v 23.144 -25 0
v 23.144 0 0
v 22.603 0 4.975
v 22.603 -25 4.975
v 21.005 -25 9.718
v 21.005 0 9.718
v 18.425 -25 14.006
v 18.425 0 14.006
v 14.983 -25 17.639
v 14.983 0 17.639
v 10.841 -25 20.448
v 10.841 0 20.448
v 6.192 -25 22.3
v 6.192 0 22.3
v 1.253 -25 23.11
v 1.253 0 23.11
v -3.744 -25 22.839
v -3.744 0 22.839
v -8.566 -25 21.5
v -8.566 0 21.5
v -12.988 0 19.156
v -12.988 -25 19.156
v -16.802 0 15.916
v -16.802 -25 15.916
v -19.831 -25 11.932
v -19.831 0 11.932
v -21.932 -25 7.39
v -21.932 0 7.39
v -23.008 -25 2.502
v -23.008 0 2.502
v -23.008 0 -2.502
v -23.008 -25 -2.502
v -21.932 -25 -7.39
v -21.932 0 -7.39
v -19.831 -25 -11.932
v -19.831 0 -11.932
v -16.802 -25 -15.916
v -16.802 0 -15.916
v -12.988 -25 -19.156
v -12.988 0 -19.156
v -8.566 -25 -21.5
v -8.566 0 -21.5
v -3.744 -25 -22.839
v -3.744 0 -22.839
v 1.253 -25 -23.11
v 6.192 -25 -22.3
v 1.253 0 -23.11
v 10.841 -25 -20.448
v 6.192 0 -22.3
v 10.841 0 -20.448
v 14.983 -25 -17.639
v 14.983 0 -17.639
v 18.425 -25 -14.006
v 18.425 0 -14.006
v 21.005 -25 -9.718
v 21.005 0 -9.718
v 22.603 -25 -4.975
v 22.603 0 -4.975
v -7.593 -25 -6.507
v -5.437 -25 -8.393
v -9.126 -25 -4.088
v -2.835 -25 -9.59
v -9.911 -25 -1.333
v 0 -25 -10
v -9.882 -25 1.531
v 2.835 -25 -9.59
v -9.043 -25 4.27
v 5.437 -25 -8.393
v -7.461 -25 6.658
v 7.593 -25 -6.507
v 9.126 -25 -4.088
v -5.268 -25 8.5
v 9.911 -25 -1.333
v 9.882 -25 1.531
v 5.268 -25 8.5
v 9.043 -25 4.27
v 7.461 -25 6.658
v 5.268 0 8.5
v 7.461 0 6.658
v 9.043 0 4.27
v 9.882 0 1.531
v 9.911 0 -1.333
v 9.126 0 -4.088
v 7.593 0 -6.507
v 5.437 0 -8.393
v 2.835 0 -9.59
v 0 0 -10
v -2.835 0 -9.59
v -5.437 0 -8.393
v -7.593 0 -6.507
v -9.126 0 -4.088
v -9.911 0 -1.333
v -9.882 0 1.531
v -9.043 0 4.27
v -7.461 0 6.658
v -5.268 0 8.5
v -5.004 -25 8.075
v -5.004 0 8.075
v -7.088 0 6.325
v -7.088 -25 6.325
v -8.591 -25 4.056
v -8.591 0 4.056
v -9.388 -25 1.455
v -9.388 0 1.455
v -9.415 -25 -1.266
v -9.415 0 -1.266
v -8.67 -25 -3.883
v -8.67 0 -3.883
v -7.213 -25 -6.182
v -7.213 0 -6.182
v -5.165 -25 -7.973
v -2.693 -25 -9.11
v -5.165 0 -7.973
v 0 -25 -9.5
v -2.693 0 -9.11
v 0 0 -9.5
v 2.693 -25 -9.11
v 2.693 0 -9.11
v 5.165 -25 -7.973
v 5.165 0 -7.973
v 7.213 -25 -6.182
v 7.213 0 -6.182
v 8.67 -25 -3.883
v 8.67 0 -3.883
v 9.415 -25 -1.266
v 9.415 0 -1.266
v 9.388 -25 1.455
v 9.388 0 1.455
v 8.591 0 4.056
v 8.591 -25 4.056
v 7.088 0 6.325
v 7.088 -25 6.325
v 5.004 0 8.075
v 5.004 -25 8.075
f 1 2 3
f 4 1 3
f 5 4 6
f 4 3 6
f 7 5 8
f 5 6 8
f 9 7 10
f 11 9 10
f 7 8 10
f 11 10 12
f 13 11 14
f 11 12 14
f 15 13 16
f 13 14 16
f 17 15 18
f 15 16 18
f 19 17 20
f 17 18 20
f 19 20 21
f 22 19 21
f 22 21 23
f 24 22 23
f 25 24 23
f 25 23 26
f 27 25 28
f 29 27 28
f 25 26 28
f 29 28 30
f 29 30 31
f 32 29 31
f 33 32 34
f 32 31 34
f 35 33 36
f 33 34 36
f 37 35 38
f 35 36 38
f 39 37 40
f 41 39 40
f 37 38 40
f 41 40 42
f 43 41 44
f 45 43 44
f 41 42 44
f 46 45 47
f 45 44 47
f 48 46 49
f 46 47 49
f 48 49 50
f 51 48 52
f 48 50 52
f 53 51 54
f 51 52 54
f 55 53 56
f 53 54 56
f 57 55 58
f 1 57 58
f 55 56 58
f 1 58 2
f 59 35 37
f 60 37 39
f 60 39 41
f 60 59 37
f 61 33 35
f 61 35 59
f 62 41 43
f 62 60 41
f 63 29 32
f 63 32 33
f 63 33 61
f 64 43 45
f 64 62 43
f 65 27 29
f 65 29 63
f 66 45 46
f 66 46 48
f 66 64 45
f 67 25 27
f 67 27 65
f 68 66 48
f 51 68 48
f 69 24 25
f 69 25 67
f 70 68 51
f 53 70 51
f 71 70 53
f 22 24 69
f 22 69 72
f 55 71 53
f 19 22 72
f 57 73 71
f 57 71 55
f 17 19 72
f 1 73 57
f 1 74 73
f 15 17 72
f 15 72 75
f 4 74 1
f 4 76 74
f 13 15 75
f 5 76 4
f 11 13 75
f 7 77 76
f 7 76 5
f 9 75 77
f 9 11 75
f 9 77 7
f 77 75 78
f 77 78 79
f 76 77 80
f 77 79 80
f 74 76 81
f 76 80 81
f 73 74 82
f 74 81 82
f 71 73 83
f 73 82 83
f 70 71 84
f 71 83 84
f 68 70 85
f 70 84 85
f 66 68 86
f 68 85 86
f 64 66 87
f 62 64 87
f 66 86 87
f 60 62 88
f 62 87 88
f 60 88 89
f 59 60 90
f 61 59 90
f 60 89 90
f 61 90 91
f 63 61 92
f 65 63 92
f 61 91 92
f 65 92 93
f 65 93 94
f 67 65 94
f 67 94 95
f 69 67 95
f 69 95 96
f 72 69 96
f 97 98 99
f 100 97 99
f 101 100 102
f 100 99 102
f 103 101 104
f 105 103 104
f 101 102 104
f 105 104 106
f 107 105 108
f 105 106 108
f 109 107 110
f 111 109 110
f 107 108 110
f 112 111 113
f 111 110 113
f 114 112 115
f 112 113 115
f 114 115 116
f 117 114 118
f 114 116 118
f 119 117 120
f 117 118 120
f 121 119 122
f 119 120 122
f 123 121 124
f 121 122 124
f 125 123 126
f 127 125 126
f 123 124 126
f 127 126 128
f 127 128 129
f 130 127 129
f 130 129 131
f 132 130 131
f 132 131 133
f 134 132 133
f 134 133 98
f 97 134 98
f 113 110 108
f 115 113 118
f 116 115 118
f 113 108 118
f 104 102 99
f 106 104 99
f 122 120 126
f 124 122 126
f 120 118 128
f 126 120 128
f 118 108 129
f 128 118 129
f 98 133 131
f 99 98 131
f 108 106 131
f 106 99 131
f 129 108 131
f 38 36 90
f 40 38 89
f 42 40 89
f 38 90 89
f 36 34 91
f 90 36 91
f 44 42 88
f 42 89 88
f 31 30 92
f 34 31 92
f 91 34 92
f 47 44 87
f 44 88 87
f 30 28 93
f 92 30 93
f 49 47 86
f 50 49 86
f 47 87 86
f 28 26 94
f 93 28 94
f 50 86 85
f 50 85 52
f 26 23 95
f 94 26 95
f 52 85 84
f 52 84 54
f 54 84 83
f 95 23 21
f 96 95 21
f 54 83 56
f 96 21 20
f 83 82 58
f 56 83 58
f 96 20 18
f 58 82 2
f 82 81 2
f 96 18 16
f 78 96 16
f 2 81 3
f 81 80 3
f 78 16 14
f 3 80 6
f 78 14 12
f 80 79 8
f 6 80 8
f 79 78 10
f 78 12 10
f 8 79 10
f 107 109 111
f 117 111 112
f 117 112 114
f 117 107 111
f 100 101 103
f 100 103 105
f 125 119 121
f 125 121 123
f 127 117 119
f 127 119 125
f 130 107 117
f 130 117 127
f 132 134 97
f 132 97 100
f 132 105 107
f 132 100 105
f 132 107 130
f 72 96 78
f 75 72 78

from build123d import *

# Parameters (mm, degrees)
F0_R     = 23.143758
F1_DEPTH = 25
F3_DEPTH = 25


with BuildPart() as f1:
    # F0 (on Front) → F1 (new body)
    with BuildSketch(Plane.XZ):
        Circle(F0_R)
        with BuildLine():
            ThreePointArc((5.267827, 8.5), (0, -10), (-5.267827, 8.5))
            Line((-5.267827, 8.5), (5.267827, 8.5))
        make_face(mode=Mode.SUBTRACT)
    extrude(amount=F1_DEPTH)


with BuildPart() as f3:
    # F2 (on Front) → F3 (new body)
    with BuildSketch(Plane.XZ):
        with BuildLine():
            Line((5.004436, 8.075), (-5.004436, 8.075))
            ThreePointArc((-5.004436, 8.075), (0, -9.5), (5.004436, 8.075))
        make_face()
    extrude(amount=F3_DEPTH)


solid = Compound([f1.part, f3.part])
